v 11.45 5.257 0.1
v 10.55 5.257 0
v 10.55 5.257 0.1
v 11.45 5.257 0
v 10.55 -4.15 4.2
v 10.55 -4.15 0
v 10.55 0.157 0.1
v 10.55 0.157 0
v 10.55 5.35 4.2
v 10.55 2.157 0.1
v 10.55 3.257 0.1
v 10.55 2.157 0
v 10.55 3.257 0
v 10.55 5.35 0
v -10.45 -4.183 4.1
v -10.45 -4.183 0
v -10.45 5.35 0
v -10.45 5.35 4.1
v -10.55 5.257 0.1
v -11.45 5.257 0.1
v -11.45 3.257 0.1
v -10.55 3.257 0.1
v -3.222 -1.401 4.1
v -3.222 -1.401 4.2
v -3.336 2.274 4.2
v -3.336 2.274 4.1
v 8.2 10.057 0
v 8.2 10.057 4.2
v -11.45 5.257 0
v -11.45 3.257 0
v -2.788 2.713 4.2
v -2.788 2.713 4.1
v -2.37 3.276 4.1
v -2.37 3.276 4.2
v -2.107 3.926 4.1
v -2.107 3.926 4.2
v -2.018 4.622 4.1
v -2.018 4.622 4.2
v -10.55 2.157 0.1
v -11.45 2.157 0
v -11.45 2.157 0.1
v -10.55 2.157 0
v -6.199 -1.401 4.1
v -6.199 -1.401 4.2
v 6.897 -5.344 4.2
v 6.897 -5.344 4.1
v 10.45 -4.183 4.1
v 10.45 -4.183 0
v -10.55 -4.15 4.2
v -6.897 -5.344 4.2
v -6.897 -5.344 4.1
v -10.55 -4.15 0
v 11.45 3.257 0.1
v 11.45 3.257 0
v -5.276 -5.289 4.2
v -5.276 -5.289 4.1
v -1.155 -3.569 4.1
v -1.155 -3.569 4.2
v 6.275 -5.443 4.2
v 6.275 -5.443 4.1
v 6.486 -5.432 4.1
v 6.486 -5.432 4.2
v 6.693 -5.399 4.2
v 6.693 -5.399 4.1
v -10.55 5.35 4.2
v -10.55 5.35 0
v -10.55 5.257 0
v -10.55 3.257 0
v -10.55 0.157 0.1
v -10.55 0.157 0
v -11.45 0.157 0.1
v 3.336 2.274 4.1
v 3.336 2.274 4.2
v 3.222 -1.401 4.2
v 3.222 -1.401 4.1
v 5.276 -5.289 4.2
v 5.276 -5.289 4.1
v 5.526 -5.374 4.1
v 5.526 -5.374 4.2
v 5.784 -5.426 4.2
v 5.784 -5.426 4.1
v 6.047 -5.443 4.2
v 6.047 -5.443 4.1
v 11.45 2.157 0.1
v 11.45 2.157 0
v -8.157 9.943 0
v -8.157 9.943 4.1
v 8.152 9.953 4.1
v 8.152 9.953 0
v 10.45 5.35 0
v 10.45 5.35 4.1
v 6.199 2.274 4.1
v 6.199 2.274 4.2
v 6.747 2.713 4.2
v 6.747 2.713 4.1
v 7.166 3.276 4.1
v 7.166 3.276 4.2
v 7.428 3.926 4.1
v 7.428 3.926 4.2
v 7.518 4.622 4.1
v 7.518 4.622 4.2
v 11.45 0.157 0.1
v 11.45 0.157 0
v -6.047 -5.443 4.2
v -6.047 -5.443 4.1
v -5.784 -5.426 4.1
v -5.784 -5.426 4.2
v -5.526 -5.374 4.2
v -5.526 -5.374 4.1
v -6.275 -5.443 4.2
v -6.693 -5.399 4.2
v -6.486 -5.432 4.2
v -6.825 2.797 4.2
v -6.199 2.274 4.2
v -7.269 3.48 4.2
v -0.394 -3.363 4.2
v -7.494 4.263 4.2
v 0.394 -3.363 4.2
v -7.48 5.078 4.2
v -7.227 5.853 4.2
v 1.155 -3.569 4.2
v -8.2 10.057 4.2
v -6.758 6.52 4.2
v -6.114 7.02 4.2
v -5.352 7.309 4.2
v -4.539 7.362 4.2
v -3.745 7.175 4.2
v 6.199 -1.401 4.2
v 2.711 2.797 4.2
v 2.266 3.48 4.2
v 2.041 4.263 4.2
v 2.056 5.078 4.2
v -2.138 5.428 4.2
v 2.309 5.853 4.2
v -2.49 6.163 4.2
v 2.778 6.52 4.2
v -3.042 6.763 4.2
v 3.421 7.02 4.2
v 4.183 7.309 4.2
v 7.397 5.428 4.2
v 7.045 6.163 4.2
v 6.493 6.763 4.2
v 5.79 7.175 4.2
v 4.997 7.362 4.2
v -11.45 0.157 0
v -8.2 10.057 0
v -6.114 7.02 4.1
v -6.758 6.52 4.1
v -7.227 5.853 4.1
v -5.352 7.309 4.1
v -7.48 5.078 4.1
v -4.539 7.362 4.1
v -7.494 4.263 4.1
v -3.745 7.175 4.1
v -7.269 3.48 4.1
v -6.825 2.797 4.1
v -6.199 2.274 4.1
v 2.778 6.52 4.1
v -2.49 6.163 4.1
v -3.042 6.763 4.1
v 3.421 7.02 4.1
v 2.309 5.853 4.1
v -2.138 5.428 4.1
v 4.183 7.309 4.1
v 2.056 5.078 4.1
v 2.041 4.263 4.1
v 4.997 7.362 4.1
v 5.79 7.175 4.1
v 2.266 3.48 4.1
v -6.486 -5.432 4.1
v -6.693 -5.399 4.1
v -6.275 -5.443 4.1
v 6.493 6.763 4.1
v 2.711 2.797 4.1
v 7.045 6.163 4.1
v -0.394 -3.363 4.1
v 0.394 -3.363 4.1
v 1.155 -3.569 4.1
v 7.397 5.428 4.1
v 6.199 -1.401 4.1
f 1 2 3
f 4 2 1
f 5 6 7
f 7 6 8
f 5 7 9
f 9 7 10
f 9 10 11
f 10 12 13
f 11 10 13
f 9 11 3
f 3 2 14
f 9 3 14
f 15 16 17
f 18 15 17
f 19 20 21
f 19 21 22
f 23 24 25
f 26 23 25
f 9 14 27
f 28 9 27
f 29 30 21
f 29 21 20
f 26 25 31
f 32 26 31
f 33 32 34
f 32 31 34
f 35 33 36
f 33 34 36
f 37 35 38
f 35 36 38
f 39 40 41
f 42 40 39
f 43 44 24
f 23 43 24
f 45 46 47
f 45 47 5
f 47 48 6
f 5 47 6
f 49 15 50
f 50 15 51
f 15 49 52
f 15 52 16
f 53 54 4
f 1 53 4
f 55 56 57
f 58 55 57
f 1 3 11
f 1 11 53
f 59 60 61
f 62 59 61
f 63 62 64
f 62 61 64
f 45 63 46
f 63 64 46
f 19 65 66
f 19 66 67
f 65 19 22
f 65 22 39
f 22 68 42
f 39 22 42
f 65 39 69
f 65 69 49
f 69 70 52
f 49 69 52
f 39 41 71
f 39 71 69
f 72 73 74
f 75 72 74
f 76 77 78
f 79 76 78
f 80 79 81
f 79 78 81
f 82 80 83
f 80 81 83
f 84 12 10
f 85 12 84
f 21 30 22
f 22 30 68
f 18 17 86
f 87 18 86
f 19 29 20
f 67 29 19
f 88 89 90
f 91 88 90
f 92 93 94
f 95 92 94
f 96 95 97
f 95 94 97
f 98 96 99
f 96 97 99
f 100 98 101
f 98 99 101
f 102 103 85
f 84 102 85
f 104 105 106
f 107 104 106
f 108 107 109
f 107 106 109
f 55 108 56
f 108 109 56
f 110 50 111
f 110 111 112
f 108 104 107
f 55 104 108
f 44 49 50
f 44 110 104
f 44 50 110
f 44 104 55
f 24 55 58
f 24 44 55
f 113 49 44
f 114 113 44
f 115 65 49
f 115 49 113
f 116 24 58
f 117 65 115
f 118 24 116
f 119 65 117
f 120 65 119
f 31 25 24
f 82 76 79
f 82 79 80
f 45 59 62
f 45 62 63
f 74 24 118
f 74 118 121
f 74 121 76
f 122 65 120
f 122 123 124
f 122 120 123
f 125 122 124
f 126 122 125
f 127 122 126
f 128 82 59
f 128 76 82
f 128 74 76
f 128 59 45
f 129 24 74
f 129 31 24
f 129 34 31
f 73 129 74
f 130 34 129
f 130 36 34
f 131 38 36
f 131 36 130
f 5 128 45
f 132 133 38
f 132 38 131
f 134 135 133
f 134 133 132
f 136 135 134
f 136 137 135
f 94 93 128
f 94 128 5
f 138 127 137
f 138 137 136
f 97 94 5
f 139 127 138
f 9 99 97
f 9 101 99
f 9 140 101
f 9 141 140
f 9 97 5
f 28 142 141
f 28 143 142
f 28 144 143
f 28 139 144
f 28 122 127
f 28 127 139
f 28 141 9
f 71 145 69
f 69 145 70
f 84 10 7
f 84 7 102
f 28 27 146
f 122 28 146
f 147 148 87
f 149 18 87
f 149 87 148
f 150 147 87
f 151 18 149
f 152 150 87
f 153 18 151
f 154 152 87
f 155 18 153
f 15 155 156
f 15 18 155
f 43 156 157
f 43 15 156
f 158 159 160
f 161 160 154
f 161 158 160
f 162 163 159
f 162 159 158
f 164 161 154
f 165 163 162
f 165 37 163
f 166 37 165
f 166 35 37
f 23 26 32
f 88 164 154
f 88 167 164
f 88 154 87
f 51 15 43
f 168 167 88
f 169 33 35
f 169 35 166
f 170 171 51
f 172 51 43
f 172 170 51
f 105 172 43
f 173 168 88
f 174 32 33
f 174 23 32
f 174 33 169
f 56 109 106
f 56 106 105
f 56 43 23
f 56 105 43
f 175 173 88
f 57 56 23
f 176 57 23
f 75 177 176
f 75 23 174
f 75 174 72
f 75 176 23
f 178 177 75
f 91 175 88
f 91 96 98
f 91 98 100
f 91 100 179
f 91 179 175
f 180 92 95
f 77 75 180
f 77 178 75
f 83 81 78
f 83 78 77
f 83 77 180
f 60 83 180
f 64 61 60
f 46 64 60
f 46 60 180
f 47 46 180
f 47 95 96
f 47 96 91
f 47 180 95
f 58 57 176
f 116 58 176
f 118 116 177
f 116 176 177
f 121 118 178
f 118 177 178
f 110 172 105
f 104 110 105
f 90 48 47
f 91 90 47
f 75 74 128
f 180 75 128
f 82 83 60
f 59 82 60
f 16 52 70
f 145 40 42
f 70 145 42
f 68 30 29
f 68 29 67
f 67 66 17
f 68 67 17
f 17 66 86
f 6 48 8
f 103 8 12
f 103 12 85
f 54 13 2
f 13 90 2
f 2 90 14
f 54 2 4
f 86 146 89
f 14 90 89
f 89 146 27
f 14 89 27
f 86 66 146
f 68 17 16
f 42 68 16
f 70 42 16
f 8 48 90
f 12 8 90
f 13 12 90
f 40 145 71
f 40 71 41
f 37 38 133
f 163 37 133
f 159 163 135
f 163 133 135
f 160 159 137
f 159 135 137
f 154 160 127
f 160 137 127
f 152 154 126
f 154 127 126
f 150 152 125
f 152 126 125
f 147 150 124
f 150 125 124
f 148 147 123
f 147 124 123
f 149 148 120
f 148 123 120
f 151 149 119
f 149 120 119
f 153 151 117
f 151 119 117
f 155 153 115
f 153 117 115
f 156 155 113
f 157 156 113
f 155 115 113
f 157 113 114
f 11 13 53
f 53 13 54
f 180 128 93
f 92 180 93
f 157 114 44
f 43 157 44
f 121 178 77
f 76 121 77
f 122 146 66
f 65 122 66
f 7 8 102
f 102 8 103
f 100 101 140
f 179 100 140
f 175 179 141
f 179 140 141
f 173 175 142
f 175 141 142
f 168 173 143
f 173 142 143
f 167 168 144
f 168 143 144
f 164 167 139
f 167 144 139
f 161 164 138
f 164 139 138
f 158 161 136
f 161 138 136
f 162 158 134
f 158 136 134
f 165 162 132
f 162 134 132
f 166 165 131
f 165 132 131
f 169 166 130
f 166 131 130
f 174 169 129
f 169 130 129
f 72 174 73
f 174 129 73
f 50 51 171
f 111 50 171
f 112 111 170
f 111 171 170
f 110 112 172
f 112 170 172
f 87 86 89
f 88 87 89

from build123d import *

# Parameters (mm, degrees)
F1_DEPTH = 4.2
F2_W     = 20.9
F2_H     = 4.1
F3_DEPTH = 10
F5_DEPTH = 4.1
F6_W     = 0.9
F6_H     = 2
F7_DEPTH = 0.1
F9_DEPTH = 25


with BuildPart() as f1:
    # F0 (on Top) → F1 (new body)
    with BuildSketch(Plane.XY):
        with BuildLine():
            Line((0, 10.05713), (-8.199971, 10.05713))
            Line((-8.199971, 10.05713), (-10.55, 5.35))
            Line((-10.55, 5.35), (-10.55, -4.15))
            Line((-10.55, -4.15), (-6.896709, -5.343926))
            ThreePointArc((-6.896709, -5.343926), (-6.589984, -5.417979), (-6.275429, -5.44287))
            Line((-6.275429, -5.44287), (-6.046804, -5.44287))
            ThreePointArc((-6.046804, -5.44287), (-5.653998, -5.403917), (-5.276493, -5.288574))
            Line((-5.276493, -5.288574), (-1.155466, -3.56865))
            ThreePointArc((-1.155466, -3.56865), (0, -3.337205), (1.155466, -3.56865))
            Line((1.155466, -3.56865), (5.276493, -5.288574))
            ThreePointArc((5.276493, -5.288574), (5.653998, -5.403917), (6.046804, -5.44287))
            Line((6.046804, -5.44287), (6.275429, -5.44287))
            ThreePointArc((6.275429, -5.44287), (6.589984, -5.417979), (6.896709, -5.343926))
            Line((6.896709, -5.343926), (10.55, -4.15))
            Line((10.55, -4.15), (10.55, 5.35))
            Line((10.55, 5.35), (8.199971, 10.05713))
            Line((8.199971, 10.05713), (0, 10.05713))
        make_face()
    extrude(amount=F1_DEPTH)

    # F2 (on face) → F3 (cut)
    with BuildSketch(Plane.XZ.offset(5.44287)):
        with Locations((0, 2.05)):
            Rectangle(F2_W, F2_H)
    extrude(amount=-F3_DEPTH, mode=Mode.SUBTRACT)

    # F4 (on face) → F5 (cut)
    with BuildSketch(Plane(origin=(0, 0, 0), x_dir=(1, 0, 0), z_dir=(0, 0, -1))):
        Polygon((10.45, -4.55713), (-10.45, -4.55713), (-10.45, -5.35), (-8.156886, -9.943129), (8.15174, -9.953437), (10.45, -5.35), align=None)
    extrude(amount=-F5_DEPTH, mode=Mode.SUBTRACT)

    # F6 (on Top) → F7 (join)
    with BuildSketch(Plane.XY):
        with Locations((-11, 4.25713)):
            Rectangle(F6_W, F6_H)
        with Locations((-11, 1.15713)):
            Rectangle(F6_W, F6_H)
        with Locations((11, 1.15713)):
            Rectangle(F6_W, F6_H)
        with Locations((11, 4.25713)):
            Rectangle(F6_W, F6_H)
    extrude(amount=F7_DEPTH)

    # F8 (on face) → F9 (cut)
    with BuildSketch(Plane.XY.offset(4.2)):
        with BuildLine():
            ThreePointArc((-3.33593, 2.273972), (-2.369798, 3.275535), (-2.017699, 4.621852))
            ThreePointArc((-2.017699, 4.621852), (-6.114016, 7.019753), (-6.199468, 2.273972))
            ThreePointArc((-6.199468, 2.273972), (-4.767699, 1.871852), (-3.33593, 2.273972))
        make_face()
        with BuildLine():
            ThreePointArc((-3.33593, 2.273972), (-4.767699, 1.871852), (-6.199468, 2.273972))
            Line((-6.199468, 2.273972), (-6.199468, -1.400822))
            Line((-6.199468, -1.400822), (-3.222397, -1.400822))
            Line((-3.222397, -1.400822), (-3.33593, 2.273972))
        make_face()
        with BuildLine():
            ThreePointArc((6.199468, 2.273972), (7.165601, 3.275535), (7.517699, 4.621852))
            ThreePointArc((7.517699, 4.621852), (3.421383, 7.019753), (3.33593, 2.273972))
            ThreePointArc((3.33593, 2.273972), (4.767699, 1.871852), (6.199468, 2.273972))
        make_face()
        with BuildLine():
            ThreePointArc((6.199468, 2.273972), (4.767699, 1.871852), (3.33593, 2.273972))
            Line((3.33593, 2.273972), (3.222397, -1.400822))
            Line((3.222397, -1.400822), (6.199468, -1.400822))
            Line((6.199468, -1.400822), (6.199468, 2.273972))
        make_face()
    extrude(amount=-F9_DEPTH, mode=Mode.SUBTRACT)


solid = f1.part
